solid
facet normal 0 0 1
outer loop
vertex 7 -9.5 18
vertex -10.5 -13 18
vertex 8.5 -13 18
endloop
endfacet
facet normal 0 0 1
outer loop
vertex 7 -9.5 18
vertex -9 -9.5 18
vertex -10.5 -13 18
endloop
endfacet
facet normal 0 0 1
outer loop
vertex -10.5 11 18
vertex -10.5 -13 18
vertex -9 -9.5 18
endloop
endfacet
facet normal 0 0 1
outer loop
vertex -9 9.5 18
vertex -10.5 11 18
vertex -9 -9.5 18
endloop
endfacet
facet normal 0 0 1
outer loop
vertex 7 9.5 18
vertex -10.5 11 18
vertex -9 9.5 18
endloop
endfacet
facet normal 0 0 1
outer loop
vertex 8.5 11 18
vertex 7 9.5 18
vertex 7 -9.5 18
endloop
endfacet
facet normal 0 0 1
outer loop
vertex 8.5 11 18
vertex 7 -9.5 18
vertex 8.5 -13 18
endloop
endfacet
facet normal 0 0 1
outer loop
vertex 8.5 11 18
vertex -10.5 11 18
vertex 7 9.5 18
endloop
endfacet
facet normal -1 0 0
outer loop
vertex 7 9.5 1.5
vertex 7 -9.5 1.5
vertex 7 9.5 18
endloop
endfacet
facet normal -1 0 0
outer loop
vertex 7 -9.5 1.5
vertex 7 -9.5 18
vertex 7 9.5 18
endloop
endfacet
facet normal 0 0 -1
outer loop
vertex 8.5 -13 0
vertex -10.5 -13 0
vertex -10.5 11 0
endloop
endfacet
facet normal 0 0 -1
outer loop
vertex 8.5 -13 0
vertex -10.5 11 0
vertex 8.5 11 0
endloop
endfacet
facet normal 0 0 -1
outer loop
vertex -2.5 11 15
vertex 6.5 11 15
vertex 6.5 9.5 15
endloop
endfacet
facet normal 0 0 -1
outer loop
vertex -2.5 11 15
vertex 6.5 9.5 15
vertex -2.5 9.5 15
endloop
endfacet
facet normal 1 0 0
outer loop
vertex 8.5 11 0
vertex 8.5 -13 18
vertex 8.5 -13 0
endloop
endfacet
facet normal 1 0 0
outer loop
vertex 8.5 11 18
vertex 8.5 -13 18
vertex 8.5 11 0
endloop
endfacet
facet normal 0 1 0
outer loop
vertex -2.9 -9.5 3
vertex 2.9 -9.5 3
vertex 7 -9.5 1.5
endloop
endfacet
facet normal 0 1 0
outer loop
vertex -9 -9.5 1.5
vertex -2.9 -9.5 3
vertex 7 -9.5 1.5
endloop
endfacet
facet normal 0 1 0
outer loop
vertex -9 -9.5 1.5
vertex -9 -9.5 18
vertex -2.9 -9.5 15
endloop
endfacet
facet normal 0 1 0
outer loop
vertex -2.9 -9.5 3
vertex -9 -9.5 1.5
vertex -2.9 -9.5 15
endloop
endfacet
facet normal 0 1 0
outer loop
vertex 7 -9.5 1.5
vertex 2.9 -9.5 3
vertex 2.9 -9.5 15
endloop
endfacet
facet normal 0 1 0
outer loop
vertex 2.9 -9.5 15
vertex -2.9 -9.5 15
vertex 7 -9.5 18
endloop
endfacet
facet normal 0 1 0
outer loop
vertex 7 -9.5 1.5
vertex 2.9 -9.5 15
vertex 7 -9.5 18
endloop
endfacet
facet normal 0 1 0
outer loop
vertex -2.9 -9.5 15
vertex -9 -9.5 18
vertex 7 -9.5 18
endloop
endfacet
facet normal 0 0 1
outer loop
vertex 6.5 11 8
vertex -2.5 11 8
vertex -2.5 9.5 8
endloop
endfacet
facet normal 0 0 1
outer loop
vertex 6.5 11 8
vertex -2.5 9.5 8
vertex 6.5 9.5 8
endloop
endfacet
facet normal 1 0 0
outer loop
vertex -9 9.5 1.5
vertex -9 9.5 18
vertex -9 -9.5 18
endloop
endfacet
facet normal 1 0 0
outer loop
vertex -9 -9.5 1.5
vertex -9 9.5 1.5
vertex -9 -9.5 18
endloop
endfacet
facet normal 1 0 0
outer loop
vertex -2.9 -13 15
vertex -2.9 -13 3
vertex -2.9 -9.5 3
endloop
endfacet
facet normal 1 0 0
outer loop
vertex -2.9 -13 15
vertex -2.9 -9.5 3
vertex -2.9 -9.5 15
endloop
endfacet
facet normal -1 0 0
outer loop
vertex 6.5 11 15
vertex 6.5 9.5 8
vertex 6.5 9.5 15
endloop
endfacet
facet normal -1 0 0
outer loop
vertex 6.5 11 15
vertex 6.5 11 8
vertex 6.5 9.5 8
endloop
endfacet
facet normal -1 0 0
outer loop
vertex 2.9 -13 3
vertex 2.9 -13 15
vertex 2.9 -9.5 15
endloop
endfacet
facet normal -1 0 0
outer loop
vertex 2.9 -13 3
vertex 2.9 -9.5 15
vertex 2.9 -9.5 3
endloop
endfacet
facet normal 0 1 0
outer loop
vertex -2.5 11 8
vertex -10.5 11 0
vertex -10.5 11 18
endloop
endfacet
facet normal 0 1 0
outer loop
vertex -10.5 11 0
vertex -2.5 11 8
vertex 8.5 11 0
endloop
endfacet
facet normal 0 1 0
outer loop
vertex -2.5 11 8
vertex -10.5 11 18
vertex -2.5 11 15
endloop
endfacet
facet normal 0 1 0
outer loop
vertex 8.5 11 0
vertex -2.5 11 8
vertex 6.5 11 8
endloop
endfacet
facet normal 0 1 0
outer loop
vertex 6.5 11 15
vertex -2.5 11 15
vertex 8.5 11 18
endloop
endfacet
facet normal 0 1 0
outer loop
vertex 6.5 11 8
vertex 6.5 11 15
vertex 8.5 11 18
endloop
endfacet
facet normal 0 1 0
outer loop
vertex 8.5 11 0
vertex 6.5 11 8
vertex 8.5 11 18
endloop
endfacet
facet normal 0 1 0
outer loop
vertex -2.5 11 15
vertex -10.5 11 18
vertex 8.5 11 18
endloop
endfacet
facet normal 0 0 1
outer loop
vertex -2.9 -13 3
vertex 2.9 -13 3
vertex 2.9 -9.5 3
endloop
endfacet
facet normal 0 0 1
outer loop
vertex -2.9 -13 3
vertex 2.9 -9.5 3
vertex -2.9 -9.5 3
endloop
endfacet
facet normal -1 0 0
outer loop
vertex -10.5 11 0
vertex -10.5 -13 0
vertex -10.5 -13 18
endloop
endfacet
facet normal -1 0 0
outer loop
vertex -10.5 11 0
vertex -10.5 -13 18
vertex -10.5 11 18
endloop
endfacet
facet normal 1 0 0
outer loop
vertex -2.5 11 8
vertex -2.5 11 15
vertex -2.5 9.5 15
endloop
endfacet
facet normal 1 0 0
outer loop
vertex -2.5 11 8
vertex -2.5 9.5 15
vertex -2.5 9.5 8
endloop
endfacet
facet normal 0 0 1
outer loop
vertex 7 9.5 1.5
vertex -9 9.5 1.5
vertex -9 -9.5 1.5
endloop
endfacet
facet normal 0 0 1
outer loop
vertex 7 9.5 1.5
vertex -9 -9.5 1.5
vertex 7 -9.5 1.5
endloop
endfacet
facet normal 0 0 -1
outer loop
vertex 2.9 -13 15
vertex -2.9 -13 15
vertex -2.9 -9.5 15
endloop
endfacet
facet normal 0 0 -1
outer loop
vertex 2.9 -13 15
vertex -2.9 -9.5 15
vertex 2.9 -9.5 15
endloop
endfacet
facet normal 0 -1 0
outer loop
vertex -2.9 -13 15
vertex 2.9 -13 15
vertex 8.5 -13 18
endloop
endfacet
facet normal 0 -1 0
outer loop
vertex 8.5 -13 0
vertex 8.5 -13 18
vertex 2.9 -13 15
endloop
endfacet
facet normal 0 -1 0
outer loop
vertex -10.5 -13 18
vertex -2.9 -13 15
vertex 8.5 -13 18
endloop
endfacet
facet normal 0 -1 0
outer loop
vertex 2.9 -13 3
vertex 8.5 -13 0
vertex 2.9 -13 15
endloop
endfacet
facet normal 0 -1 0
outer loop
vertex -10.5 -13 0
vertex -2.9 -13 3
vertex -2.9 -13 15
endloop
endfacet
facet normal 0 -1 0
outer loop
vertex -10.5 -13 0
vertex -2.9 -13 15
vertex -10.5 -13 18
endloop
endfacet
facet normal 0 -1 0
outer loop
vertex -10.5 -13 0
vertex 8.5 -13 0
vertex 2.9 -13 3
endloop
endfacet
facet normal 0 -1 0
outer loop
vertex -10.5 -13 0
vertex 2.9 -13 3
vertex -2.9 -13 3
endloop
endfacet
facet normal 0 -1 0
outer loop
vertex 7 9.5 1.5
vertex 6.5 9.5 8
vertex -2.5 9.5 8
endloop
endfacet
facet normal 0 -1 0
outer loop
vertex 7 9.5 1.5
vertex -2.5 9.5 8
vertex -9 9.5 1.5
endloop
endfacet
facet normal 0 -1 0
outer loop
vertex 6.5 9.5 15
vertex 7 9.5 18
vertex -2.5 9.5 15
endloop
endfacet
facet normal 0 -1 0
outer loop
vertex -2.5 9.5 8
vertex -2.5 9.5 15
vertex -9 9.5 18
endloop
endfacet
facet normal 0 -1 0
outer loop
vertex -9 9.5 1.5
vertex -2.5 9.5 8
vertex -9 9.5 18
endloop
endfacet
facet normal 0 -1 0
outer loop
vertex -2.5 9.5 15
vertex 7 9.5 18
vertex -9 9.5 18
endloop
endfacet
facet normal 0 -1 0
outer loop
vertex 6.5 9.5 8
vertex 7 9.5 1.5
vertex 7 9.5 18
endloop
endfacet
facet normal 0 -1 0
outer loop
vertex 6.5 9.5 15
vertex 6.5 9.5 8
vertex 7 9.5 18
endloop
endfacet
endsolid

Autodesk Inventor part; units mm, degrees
ref_plane "YZ Plane" through (0, 0, 0) normal (1, 0, 0) x (0, 1, 0)
ref_plane "XZ Plane" through (0, 0, 0) normal (0, 1, 0) x (-1, 0, 0)
ref_plane "XY Plane" through (0, 0, 0) normal (0, 0, 1) x (1, 0, 0)
sketch "Náčrt1" plane through (0, 0, 0) normal (0, 0, 1) x (1, 0, 0)
  line L0 (0, 18.2) -> (0, -18.2) projected
  line L1 (-14.7, 0) -> (14.7, 0) projected
  line L2 (-10.5, 13) -> (10.5, 13)
  line L3 (10.5, 13) -> (10.5, -13)
  line L4 (10.5, -13) -> (-10.5, -13)
  line L5 (-10.5, -13) -> (-10.5, 13)
  line L6 (-10.5, 13) -> (10.5, -13) construction
  line L7 (10.5, 13) -> (-10.5, -13) construction
  point P0 (0, 0)
  dimension "d0" = 21
  dimension "d1" = 26
extrude "Vysunutí1" add sketch "Náčrt1" along normal blind 18
sketch "Náčrt4" plane through (0, 0, 18) normal (0, 0, 1) x (1, 0, 0)
  line L0 (-14.7, 0) -> (14.7, 0) projected
  line L1 (0, 18.2) -> (0, -18.2) projected
  line L2 (-10.5, -13) -> (10.5, -13) projected
  line L3 (10.5, -13) -> (10.5, 13) projected
  line L4 (10.5, 13) -> (-10.5, 13) projected
  line L5 (-10.5, 13) -> (-10.5, -13) projected
  line L6 (-9, -9.5) -> (7, -9.5)
  line L7 (7, -9.5) -> (7, 9.5)
  line L8 (7, 9.5) -> (-9, 9.5)
  line L9 (-9, 9.5) -> (-9, -9.5)
  point P0 (0, 0)
  dimension "d9" = 3.5
  dimension "d34" = 16
  dimension "d35" = 1.5
  dimension "d36" = 19
extrude "Vysunutí2" cut sketch "Náčrt4" against normal blind 16.5 contours L9 L8 L1 L0 | L0 L1 L6 L9 | L1 L8 L7 L0 | L0 L7 L6 L1
sketch "Náčrt5" plane through (-10.5, 13, 0) normal (0, 1, 0) x (1, 0, 0)
  line L0 (21, 0) -> (0, 0) projected
  line L1 (0, 0) -> (0, -18) projected
  line L2 (21, -18) -> (0, -18) projected
  line L3 (21, 0) -> (21, -18) projected
  line L4 (17, -15) -> (8, -15)
  line L5 (8, -15) -> (8, -8)
  line L6 (8, -8) -> (17, -8)
  line L7 (17, -8) -> (17, -15)
  line L8 (17, -15) -> (8, -8) construction
  line L9 (8, -15) -> (17, -8) construction
  point P0 (10.5, 0)
  point P1 (12.5, -11.5)
  dimension "d12" = 9
  dimension "d13" = 7
  dimension "d14" = 3
  dimension "d15" = 8
extrude "Vysunutí3" cut sketch "Náčrt5" against normal up to surface (3.5 mm away) contours L4 L5 L6 L7
sketch "Náčrt6" plane through (-10.5, -13, 0) normal (0, -1, 0) x (1, 0, 0)
  line L0 (0, 0) -> (21, 0) projected
  line L1 (21, 0) -> (21, 18) projected
  line L2 (0, 18) -> (21, 18) projected
  line L3 (0, 0) -> (0, 18) projected
  line L4 (7.6, 15) -> (13.4, 15)
  line L5 (13.4, 15) -> (13.4, 3)
  line L6 (13.4, 3) -> (7.6, 3)
  line L7 (7.6, 3) -> (7.6, 15)
  line L8 (7.6, 15) -> (13.4, 3) construction
  line L9 (13.4, 15) -> (7.6, 3) construction
  point P0 (10.5, 0)
  point P1 (10.5, 9)
  dimension "d18" = 5.8
  dimension "d19" = 12
  dimension "d20" = 10.5
  dimension "d21" = 9
extrude "Vysunutí4" cut sketch "Náčrt6" against normal up to surface (3.5 mm away) contours L4 L5 L6 L7
sketch "Náčrt8" plane through (0, 0, 18) normal (0, 0, 1) x (1, 0, 0)
  line L0 (7, 9.5) -> (7, -9.5) projected
  line L1 (7, -9.5) -> (-9, -9.5) projected
  line L2 (-9, -9.5) -> (-9, 9.5) projected
  line L3 (-9, 9.5) -> (7, 9.5) projected
  line L4 (-10.5, -13) -> (10.5, -13) projected
  line L5 (10.5, -13) -> (10.5, 13) projected
  line L6 (10.5, 13) -> (-10.5, 13) projected
  line L7 (-10.5, 13) -> (-10.5, -13) projected
  line L8 (-10.5, 11) -> (8.5, 11)
  line L9 (8.5, -13) -> (8.5, 11)
  point P0 (0, 0)
  dimension "d37" = 1.5
  dimension "d38" = 1.5
extrude "Vysunutí6" cut sketch "Náčrt8" against normal through all contours L9 L8 L7 L6 L5 L4
properties part number "senzor_obal_3D tisk"
